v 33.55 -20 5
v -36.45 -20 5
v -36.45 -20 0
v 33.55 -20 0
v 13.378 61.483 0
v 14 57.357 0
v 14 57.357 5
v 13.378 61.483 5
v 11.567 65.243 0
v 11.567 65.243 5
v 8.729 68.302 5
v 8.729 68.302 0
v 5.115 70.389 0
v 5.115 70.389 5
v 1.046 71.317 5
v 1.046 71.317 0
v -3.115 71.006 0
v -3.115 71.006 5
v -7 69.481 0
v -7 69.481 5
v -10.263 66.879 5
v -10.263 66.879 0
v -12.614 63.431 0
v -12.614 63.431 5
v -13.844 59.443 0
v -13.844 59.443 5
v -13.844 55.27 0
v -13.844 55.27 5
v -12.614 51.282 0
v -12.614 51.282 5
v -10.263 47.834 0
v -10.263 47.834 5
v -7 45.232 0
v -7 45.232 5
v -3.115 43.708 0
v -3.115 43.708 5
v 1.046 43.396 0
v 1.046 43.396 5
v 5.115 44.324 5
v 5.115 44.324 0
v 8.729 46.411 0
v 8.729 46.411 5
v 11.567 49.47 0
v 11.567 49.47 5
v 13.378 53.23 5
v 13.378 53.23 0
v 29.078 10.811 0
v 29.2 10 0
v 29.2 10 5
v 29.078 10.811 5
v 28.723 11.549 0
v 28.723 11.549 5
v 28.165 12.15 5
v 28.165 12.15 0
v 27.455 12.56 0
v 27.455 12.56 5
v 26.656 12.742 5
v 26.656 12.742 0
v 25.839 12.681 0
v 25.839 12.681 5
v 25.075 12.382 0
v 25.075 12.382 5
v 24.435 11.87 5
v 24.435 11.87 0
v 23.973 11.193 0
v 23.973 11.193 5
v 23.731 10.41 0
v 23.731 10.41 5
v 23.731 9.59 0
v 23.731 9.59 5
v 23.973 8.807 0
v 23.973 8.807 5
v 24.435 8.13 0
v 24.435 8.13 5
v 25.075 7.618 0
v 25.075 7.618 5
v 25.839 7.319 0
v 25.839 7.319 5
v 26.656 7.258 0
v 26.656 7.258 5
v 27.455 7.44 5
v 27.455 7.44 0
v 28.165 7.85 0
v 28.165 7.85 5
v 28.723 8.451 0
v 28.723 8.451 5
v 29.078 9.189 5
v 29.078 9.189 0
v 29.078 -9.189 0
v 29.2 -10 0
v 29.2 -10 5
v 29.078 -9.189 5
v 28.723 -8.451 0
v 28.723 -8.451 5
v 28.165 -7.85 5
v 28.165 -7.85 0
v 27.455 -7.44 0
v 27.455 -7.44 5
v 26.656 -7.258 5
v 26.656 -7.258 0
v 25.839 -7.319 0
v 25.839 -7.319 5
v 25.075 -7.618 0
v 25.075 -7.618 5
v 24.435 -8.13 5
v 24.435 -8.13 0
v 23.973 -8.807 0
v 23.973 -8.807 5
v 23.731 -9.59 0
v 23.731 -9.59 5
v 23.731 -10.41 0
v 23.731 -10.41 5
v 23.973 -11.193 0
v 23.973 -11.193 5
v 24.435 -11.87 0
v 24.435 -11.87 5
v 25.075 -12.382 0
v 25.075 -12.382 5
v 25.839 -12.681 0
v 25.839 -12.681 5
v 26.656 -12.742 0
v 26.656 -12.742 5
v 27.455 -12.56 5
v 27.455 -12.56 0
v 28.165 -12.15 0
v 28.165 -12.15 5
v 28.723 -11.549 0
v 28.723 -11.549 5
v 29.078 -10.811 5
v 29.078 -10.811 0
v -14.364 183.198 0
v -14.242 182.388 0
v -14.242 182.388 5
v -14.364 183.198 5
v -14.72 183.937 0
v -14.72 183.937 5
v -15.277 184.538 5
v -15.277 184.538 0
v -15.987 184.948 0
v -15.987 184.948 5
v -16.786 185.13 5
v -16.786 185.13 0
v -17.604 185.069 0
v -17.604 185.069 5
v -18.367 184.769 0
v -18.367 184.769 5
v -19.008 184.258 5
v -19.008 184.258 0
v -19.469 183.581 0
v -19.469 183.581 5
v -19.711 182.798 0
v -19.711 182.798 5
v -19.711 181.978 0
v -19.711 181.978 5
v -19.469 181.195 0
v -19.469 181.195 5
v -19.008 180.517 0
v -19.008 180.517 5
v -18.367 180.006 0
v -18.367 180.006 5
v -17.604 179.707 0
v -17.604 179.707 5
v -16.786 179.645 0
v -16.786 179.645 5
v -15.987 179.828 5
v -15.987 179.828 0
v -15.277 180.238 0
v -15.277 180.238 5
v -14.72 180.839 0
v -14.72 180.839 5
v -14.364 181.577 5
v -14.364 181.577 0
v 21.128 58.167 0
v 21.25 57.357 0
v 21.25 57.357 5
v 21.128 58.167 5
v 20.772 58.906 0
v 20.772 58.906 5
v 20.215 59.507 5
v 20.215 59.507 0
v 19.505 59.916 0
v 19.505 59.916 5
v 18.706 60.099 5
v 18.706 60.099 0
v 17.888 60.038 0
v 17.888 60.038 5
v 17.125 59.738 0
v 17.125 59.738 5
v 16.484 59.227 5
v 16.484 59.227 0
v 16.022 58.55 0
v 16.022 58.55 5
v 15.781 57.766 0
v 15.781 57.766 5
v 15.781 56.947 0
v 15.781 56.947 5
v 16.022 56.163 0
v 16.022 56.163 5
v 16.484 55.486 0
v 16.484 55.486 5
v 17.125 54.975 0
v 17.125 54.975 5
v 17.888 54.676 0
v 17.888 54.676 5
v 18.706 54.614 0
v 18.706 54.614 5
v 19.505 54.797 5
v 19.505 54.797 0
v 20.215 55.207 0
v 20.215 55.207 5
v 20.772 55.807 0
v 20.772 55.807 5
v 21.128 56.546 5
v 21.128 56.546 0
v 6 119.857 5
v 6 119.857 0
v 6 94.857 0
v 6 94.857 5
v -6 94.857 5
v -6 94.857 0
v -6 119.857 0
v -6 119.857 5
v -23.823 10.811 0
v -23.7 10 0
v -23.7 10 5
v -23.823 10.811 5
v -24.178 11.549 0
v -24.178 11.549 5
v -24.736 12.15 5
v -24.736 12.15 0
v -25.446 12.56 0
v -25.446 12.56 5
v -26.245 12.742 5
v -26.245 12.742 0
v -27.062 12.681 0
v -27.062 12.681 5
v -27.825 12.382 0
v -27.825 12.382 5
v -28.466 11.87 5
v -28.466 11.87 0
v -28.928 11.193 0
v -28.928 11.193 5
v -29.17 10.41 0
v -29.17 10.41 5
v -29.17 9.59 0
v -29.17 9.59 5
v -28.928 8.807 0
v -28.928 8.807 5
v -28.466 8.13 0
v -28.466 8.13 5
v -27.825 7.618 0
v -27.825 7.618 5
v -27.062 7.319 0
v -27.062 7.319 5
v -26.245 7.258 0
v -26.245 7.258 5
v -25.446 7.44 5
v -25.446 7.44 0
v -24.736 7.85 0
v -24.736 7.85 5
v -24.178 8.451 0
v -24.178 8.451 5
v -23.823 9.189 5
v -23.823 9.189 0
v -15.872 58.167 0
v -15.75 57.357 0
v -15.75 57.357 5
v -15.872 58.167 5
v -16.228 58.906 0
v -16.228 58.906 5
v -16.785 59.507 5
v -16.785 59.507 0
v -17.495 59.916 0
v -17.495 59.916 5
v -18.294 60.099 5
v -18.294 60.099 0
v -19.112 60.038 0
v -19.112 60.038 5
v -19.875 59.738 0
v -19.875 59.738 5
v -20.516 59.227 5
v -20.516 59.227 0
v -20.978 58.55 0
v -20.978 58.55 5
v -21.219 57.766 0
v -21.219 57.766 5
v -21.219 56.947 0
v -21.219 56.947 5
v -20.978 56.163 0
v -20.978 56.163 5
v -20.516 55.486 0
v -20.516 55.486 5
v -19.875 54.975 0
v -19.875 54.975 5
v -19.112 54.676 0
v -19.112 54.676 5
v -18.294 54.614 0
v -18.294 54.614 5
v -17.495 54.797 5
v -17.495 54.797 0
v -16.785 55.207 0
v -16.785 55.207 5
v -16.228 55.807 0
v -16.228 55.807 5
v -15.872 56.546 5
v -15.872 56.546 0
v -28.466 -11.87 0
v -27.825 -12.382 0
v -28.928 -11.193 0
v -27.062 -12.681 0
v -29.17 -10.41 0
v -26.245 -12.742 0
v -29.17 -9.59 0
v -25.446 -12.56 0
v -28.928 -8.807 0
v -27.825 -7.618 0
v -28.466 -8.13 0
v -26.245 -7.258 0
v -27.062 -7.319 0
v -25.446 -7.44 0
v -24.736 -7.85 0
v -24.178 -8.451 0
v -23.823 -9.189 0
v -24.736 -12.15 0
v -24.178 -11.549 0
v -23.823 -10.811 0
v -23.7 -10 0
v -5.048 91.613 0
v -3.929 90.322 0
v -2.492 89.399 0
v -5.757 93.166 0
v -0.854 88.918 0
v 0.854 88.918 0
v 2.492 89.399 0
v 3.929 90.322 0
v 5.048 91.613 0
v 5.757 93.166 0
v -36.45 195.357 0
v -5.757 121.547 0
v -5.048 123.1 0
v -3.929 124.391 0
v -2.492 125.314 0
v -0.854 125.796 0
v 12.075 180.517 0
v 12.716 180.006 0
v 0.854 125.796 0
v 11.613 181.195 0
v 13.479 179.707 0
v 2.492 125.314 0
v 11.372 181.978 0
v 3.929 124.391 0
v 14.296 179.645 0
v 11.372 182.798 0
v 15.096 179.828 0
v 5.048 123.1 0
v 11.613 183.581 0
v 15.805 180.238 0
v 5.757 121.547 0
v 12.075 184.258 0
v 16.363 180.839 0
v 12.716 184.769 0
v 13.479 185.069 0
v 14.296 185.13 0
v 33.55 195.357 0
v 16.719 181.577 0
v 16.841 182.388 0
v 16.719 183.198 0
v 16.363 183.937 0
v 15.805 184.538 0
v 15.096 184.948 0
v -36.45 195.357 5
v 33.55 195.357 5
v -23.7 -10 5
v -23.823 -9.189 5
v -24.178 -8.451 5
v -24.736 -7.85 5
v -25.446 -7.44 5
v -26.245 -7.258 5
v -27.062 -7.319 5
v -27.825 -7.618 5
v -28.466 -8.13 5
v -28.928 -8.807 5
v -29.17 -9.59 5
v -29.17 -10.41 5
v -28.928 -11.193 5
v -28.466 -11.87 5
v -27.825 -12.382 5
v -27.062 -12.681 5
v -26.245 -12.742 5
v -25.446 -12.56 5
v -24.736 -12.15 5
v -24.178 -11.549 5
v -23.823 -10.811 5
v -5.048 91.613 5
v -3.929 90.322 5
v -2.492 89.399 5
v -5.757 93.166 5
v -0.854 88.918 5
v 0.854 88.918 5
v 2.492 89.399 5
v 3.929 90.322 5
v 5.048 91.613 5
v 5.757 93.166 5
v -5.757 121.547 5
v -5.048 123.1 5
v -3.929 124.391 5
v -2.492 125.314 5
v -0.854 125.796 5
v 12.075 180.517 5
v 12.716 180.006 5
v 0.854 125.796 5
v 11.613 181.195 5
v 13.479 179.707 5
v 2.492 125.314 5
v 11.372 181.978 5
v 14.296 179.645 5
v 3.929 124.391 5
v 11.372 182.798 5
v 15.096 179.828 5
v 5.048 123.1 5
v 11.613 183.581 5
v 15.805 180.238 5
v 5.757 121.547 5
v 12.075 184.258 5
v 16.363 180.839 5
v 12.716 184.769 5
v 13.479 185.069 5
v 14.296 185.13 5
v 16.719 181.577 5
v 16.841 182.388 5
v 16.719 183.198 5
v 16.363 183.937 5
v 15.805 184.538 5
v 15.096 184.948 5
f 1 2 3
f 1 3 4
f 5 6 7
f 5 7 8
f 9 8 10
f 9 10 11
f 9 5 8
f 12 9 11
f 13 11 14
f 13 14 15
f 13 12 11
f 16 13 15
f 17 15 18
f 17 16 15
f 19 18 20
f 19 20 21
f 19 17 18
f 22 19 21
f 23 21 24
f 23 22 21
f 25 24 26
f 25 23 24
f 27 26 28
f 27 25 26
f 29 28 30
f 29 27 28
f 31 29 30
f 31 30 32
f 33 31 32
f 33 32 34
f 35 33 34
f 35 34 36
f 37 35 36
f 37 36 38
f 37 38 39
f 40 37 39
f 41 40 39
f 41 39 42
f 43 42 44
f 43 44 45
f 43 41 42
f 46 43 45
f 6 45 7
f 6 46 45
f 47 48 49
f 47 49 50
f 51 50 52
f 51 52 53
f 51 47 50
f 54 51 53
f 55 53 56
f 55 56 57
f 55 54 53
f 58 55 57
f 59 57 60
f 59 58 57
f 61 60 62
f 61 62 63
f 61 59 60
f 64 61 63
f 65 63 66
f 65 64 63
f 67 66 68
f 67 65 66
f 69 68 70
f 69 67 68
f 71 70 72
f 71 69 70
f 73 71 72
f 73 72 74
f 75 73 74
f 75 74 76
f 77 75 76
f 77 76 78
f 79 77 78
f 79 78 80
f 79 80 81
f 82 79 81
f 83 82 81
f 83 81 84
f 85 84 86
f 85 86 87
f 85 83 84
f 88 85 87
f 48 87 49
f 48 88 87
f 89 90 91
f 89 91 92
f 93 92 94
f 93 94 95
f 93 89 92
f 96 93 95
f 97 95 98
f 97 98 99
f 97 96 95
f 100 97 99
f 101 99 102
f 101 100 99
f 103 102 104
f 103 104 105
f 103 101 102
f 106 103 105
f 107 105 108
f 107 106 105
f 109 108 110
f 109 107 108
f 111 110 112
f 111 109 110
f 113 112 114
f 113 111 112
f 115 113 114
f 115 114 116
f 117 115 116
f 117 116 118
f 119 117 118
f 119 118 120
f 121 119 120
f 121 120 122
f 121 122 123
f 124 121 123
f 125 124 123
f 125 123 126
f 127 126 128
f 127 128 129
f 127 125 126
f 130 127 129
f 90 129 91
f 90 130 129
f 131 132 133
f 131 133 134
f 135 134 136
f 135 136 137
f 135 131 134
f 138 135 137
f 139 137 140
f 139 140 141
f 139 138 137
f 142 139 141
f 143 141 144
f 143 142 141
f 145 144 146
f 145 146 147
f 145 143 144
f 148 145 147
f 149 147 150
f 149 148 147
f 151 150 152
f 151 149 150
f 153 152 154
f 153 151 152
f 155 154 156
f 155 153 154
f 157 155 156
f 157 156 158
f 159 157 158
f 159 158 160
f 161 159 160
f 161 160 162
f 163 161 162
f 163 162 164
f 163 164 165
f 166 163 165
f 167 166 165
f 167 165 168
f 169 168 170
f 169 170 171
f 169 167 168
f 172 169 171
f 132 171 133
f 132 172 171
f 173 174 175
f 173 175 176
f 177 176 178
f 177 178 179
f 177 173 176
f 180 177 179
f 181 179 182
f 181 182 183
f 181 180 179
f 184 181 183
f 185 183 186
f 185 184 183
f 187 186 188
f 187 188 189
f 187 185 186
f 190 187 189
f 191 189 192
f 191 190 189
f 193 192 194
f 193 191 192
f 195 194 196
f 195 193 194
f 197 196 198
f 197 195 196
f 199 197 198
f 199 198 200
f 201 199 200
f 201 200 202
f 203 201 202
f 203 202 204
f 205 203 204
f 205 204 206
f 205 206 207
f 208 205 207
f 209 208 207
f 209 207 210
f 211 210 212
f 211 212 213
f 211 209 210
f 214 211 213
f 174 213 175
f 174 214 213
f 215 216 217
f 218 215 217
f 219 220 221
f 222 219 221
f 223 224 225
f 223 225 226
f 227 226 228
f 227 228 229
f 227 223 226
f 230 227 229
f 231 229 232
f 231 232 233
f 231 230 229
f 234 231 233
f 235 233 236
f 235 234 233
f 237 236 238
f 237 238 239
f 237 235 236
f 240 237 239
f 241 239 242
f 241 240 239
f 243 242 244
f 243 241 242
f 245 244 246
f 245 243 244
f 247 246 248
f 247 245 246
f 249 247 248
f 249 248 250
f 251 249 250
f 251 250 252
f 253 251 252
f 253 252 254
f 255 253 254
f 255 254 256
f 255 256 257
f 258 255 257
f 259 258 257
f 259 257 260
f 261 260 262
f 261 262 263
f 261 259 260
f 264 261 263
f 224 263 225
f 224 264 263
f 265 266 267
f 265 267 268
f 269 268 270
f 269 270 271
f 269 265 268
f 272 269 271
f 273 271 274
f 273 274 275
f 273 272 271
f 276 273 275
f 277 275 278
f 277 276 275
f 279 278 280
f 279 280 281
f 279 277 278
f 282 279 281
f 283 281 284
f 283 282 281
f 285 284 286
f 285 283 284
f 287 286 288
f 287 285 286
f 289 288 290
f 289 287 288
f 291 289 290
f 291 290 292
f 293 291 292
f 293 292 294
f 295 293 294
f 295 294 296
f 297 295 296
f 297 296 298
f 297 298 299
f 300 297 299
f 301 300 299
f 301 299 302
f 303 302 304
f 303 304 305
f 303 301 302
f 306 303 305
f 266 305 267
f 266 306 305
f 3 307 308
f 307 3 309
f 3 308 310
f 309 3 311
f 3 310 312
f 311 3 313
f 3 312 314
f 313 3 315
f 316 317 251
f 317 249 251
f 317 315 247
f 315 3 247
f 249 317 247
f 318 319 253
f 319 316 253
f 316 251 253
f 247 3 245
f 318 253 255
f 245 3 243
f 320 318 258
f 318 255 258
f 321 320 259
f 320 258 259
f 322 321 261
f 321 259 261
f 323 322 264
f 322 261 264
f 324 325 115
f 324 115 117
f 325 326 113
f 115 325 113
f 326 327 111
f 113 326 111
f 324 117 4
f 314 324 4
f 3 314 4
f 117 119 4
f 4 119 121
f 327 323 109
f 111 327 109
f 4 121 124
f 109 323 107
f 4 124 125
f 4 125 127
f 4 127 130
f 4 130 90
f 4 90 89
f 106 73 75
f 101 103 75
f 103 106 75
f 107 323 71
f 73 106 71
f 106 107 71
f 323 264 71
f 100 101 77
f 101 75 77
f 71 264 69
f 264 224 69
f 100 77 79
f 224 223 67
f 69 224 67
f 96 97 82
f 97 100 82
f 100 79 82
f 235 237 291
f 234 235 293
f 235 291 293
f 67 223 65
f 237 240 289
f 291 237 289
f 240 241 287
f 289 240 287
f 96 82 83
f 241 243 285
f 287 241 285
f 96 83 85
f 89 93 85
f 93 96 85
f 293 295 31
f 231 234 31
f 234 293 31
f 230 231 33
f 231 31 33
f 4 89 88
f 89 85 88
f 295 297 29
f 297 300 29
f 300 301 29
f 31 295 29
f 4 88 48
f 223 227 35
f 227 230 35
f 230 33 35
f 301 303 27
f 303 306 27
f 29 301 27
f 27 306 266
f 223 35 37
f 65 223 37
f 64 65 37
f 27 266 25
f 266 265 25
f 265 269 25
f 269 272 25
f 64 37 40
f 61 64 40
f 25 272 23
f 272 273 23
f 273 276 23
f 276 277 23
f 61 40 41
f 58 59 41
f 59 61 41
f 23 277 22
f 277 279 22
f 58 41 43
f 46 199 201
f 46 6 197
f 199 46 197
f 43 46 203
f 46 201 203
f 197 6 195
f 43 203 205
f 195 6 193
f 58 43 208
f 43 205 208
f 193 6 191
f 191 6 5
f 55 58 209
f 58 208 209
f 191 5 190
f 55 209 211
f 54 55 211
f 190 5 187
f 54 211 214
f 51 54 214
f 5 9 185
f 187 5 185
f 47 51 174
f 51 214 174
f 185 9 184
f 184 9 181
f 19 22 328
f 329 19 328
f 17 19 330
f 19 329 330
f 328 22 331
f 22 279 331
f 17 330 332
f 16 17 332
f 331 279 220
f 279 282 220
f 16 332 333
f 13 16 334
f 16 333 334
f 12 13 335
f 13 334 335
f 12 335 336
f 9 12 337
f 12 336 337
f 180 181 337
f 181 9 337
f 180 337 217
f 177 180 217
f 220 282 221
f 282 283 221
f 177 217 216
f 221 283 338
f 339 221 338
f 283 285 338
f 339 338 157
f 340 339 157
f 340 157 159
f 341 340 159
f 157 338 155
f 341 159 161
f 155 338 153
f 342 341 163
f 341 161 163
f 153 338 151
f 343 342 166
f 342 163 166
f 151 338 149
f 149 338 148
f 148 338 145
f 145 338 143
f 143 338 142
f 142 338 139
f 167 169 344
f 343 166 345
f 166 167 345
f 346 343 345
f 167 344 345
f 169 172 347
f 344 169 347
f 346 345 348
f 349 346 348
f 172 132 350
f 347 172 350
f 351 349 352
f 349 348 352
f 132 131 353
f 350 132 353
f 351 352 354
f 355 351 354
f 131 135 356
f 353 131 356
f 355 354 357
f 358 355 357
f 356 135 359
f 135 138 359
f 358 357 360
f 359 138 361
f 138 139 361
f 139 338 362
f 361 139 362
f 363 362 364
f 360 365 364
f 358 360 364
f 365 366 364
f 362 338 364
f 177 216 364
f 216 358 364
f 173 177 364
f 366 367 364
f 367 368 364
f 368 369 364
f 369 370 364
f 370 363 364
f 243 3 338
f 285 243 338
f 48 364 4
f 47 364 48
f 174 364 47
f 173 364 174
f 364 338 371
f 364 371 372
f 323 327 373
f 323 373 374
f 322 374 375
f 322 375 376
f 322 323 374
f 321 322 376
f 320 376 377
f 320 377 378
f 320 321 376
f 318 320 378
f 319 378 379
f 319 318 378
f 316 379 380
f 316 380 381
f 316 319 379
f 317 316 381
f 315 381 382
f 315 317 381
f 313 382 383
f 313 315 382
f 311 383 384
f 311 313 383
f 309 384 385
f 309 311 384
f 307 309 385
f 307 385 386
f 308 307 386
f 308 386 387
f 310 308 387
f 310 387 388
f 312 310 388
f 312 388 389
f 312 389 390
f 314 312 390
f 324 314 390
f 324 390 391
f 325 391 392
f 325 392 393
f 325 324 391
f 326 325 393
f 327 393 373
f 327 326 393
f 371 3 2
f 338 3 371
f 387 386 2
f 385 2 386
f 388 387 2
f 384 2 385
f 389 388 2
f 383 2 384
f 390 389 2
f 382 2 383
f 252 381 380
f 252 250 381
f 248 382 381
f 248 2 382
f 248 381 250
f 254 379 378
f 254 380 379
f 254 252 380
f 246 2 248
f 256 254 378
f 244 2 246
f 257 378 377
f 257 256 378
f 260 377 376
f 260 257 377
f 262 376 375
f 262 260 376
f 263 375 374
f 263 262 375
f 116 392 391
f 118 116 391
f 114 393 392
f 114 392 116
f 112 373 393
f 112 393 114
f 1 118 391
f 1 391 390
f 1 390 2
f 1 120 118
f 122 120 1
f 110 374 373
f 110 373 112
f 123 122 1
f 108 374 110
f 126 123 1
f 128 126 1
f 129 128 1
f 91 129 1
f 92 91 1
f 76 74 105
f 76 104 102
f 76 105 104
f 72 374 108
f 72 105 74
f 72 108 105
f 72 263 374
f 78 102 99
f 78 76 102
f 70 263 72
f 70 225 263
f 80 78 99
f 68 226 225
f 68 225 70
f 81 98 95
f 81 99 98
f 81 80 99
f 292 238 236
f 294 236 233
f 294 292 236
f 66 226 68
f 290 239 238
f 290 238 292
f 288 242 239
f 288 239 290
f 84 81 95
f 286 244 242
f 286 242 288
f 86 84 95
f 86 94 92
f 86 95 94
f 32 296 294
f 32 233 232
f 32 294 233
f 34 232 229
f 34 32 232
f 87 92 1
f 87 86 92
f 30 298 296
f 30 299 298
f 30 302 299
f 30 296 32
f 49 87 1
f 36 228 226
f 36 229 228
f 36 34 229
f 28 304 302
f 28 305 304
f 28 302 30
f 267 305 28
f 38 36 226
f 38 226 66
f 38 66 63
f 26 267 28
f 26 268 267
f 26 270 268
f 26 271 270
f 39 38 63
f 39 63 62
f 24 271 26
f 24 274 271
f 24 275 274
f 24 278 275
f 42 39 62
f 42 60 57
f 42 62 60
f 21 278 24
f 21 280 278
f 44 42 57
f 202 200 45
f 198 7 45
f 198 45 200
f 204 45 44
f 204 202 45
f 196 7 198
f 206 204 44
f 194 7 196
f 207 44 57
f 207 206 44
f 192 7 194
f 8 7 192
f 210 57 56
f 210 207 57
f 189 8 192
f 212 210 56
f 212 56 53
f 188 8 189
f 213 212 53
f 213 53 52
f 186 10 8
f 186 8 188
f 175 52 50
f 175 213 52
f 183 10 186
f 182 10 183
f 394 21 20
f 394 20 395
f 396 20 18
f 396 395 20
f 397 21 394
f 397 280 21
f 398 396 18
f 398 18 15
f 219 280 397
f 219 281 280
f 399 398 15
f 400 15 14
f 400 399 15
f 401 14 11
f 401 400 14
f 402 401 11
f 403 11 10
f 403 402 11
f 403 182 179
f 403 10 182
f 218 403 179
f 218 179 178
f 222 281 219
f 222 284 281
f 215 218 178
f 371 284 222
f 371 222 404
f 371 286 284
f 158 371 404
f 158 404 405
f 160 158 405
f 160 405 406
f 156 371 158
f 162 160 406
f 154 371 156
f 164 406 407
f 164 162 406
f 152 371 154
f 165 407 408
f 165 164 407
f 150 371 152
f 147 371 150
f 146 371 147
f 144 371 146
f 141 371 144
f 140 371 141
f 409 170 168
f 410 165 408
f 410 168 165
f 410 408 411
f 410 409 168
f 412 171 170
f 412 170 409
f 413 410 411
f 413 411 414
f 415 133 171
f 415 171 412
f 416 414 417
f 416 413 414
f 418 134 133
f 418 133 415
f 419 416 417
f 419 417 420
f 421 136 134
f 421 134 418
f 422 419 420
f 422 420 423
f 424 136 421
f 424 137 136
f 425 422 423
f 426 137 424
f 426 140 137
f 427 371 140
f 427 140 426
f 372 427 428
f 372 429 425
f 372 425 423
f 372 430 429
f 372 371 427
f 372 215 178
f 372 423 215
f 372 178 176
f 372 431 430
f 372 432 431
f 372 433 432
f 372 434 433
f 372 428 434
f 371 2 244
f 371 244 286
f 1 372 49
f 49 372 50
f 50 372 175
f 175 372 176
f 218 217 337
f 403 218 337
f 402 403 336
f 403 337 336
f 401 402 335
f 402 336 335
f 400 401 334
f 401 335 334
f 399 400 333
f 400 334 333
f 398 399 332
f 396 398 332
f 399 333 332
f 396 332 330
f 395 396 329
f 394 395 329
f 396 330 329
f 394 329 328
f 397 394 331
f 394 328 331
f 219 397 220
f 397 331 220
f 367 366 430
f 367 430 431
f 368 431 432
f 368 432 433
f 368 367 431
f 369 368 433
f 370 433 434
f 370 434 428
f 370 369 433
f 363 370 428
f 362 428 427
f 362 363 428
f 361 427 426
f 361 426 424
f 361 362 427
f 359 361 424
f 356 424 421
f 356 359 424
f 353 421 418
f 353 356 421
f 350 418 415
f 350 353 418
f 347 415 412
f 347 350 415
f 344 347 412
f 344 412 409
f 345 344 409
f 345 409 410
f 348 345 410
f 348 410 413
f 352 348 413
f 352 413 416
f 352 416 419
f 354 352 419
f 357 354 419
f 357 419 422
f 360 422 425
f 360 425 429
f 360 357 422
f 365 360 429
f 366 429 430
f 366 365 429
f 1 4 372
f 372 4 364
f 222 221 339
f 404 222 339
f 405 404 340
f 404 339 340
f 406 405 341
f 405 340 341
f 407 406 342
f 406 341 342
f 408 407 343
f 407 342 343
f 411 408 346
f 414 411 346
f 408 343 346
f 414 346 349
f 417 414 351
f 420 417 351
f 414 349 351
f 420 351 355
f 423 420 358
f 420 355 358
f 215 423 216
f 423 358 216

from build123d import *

# Parameters (mm, degrees)
SKETCH1_W           = 70
SKETCH1_H           = 154.713144252
SKETCH1_R           = 2.75
SKETCH1_R_2         = 14
BOSS_EXTRUDE1_DEPTH = 5
SKETCH1_4_W         = 70
SKETCH1_4_H         = 118
SKETCH1_4_R         = 2.75
BOSS_EXTRUDE2_DEPTH = 5
CUT_EXTRUDE1_START  = -10
SKETCH2_W           = 70
SKETCH2_H           = 57.356572126
CUT_EXTRUDE1_DEPTH  = 10


with BuildPart() as part:
    # Sketch1 → Boss-Extrude1 (new body)
    with BuildSketch(Plane.XY):
        with Locations((-1.450472168, 0)):
            Rectangle(SKETCH1_W, SKETCH1_H)
        with Locations((-26.450472168, -10)):
            Circle(SKETCH1_R, mode=Mode.SUBTRACT)
        with BuildLine():
            ThreePointArc((-17.05, -64.643427874), (-15.5, -63.093427874), (-13.95, -64.643427874))
            Line((-13.95, -64.643427874), (-13.95, -71.643427874))
            ThreePointArc((-13.95, -71.643427874), (-15.5, -73.193427874), (-17.05, -71.643427874))
            Line((-17.05, -71.643427874), (-17.05, -64.643427874))
        make_face(mode=Mode.SUBTRACT)
        with BuildLine():
            ThreePointArc((-17.05, -33.643427874), (-15.5, -32.093427874), (-13.95, -33.643427874))
            Line((-13.95, -33.643427874), (-13.95, -40.643427874))
            ThreePointArc((-13.95, -40.643427874), (-15.5, -42.193427874), (-17.05, -40.643427874))
            Line((-17.05, -40.643427874), (-17.05, -33.643427874))
        make_face(mode=Mode.SUBTRACT)
        with Locations((-26.450472168, 10)):
            Circle(SKETCH1_R, mode=Mode.SUBTRACT)
        with Locations((-18.5, 57.356572126)):
            Circle(SKETCH1_R, mode=Mode.SUBTRACT)
        with BuildLine():
            ThreePointArc((12, -56.143427874), (0, -68.143427874), (-12, -56.143427874))
            Line((-12, -56.143427874), (-12, -49.143427874))
            ThreePointArc((-12, -49.143427874), (0, -37.143427874), (12, -49.143427874))
            Line((12, -49.143427874), (12, -56.143427874))
        make_face(mode=Mode.SUBTRACT)
        with BuildLine():
            ThreePointArc((13.95, -64.643427874), (15.5, -63.093427874), (17.05, -64.643427874))
            Line((17.05, -64.643427874), (17.05, -71.643427874))
            ThreePointArc((17.05, -71.643427874), (15.5, -73.193427874), (13.95, -71.643427874))
            Line((13.95, -71.643427874), (13.95, -64.643427874))
        make_face(mode=Mode.SUBTRACT)
        with BuildLine():
            ThreePointArc((13.95, -33.643427874), (15.5, -32.093427874), (17.05, -33.643427874))
            Line((17.05, -33.643427874), (17.05, -40.643427874))
            ThreePointArc((17.05, -40.643427874), (15.5, -42.193427874), (13.95, -40.643427874))
            Line((13.95, -40.643427874), (13.95, -33.643427874))
        make_face(mode=Mode.SUBTRACT)
        with Locations((26.450472168, -10)):
            Circle(SKETCH1_R, mode=Mode.SUBTRACT)
        with Locations((0, 57.356572126)):
            Circle(SKETCH1_R_2, mode=Mode.SUBTRACT)
        with Locations((26.450472168, 10)):
            Circle(SKETCH1_R, mode=Mode.SUBTRACT)
        with Locations((18.5, 57.356572126)):
            Circle(SKETCH1_R, mode=Mode.SUBTRACT)
    extrude(amount=BOSS_EXTRUDE1_DEPTH)

    # Sketch1<4> → Boss-Extrude2 (add)
    with BuildSketch(Plane.XY):
        with Locations((-1.450472168, 136.356572126)):
            Rectangle(SKETCH1_4_W, SKETCH1_4_H)
        with Locations((-16.991825546, 182.387739686)):
            Circle(SKETCH1_4_R, mode=Mode.SUBTRACT)
        with BuildLine():
            ThreePointArc((-6, 119.856572126), (0, 125.856572126), (6, 119.856572126))
            Line((6, 119.856572126), (6, 94.856572126))
            ThreePointArc((6, 94.856572126), (0, 88.856572126), (-6, 94.856572126))
            Line((-6, 94.856572126), (-6, 119.856572126))
        make_face(mode=Mode.SUBTRACT)
        with Locations((14.09088121, 182.387739686)):
            Circle(SKETCH1_4_R, mode=Mode.SUBTRACT)
    extrude(amount=BOSS_EXTRUDE2_DEPTH)

    # Sketch2 → Cut-Extrude1 (cut)
    with BuildSketch(Plane.XY.offset(5).offset(CUT_EXTRUDE1_START)):
        with Locations((-1.450472168, -48.678286063)):
            Rectangle(SKETCH2_W, SKETCH2_H)
        with BuildLine():
            Line((-13.95, -64.643427874), (-13.95, -71.643427874))
            ThreePointArc((-13.95, -71.643427874), (-15.5, -73.193427874), (-17.05, -71.643427874))
            Line((-17.05, -71.643427874), (-17.05, -64.643427874))
            ThreePointArc((-17.05, -64.643427874), (-15.5, -63.093427874), (-13.95, -64.643427874))
        make_face(mode=Mode.SUBTRACT)
        with BuildLine():
            Line((-13.95, -33.643427874), (-13.95, -40.643427874))
            ThreePointArc((-13.95, -40.643427874), (-15.5, -42.193427874), (-17.05, -40.643427874))
            Line((-17.05, -40.643427874), (-17.05, -33.643427874))
            ThreePointArc((-17.05, -33.643427874), (-15.5, -32.093427874), (-13.95, -33.643427874))
        make_face(mode=Mode.SUBTRACT)
        with BuildLine():
            Line((-12, -56.143427874), (-12, -49.143427874))
            ThreePointArc((-12, -49.143427874), (0, -37.143427874), (12, -49.143427874))
            Line((12, -49.143427874), (12, -56.143427874))
            ThreePointArc((12, -56.143427874), (0, -68.143427874), (-12, -56.143427874))
        make_face(mode=Mode.SUBTRACT)
        with BuildLine():
            Line((17.05, -64.643427874), (17.05, -71.643427874))
            ThreePointArc((17.05, -71.643427874), (15.5, -73.193427874), (13.95, -71.643427874))
            Line((13.95, -71.643427874), (13.95, -64.643427874))
            ThreePointArc((13.95, -64.643427874), (15.5, -63.093427874), (17.05, -64.643427874))
        make_face(mode=Mode.SUBTRACT)
        with BuildLine():
            Line((17.05, -33.643427874), (17.05, -40.643427874))
            ThreePointArc((17.05, -40.643427874), (15.5, -42.193427874), (13.95, -40.643427874))
            Line((13.95, -40.643427874), (13.95, -33.643427874))
            ThreePointArc((13.95, -33.643427874), (15.5, -32.093427874), (17.05, -33.643427874))
        make_face(mode=Mode.SUBTRACT)
    extrude(amount=CUT_EXTRUDE1_DEPTH, mode=Mode.SUBTRACT)


solid = part.part
